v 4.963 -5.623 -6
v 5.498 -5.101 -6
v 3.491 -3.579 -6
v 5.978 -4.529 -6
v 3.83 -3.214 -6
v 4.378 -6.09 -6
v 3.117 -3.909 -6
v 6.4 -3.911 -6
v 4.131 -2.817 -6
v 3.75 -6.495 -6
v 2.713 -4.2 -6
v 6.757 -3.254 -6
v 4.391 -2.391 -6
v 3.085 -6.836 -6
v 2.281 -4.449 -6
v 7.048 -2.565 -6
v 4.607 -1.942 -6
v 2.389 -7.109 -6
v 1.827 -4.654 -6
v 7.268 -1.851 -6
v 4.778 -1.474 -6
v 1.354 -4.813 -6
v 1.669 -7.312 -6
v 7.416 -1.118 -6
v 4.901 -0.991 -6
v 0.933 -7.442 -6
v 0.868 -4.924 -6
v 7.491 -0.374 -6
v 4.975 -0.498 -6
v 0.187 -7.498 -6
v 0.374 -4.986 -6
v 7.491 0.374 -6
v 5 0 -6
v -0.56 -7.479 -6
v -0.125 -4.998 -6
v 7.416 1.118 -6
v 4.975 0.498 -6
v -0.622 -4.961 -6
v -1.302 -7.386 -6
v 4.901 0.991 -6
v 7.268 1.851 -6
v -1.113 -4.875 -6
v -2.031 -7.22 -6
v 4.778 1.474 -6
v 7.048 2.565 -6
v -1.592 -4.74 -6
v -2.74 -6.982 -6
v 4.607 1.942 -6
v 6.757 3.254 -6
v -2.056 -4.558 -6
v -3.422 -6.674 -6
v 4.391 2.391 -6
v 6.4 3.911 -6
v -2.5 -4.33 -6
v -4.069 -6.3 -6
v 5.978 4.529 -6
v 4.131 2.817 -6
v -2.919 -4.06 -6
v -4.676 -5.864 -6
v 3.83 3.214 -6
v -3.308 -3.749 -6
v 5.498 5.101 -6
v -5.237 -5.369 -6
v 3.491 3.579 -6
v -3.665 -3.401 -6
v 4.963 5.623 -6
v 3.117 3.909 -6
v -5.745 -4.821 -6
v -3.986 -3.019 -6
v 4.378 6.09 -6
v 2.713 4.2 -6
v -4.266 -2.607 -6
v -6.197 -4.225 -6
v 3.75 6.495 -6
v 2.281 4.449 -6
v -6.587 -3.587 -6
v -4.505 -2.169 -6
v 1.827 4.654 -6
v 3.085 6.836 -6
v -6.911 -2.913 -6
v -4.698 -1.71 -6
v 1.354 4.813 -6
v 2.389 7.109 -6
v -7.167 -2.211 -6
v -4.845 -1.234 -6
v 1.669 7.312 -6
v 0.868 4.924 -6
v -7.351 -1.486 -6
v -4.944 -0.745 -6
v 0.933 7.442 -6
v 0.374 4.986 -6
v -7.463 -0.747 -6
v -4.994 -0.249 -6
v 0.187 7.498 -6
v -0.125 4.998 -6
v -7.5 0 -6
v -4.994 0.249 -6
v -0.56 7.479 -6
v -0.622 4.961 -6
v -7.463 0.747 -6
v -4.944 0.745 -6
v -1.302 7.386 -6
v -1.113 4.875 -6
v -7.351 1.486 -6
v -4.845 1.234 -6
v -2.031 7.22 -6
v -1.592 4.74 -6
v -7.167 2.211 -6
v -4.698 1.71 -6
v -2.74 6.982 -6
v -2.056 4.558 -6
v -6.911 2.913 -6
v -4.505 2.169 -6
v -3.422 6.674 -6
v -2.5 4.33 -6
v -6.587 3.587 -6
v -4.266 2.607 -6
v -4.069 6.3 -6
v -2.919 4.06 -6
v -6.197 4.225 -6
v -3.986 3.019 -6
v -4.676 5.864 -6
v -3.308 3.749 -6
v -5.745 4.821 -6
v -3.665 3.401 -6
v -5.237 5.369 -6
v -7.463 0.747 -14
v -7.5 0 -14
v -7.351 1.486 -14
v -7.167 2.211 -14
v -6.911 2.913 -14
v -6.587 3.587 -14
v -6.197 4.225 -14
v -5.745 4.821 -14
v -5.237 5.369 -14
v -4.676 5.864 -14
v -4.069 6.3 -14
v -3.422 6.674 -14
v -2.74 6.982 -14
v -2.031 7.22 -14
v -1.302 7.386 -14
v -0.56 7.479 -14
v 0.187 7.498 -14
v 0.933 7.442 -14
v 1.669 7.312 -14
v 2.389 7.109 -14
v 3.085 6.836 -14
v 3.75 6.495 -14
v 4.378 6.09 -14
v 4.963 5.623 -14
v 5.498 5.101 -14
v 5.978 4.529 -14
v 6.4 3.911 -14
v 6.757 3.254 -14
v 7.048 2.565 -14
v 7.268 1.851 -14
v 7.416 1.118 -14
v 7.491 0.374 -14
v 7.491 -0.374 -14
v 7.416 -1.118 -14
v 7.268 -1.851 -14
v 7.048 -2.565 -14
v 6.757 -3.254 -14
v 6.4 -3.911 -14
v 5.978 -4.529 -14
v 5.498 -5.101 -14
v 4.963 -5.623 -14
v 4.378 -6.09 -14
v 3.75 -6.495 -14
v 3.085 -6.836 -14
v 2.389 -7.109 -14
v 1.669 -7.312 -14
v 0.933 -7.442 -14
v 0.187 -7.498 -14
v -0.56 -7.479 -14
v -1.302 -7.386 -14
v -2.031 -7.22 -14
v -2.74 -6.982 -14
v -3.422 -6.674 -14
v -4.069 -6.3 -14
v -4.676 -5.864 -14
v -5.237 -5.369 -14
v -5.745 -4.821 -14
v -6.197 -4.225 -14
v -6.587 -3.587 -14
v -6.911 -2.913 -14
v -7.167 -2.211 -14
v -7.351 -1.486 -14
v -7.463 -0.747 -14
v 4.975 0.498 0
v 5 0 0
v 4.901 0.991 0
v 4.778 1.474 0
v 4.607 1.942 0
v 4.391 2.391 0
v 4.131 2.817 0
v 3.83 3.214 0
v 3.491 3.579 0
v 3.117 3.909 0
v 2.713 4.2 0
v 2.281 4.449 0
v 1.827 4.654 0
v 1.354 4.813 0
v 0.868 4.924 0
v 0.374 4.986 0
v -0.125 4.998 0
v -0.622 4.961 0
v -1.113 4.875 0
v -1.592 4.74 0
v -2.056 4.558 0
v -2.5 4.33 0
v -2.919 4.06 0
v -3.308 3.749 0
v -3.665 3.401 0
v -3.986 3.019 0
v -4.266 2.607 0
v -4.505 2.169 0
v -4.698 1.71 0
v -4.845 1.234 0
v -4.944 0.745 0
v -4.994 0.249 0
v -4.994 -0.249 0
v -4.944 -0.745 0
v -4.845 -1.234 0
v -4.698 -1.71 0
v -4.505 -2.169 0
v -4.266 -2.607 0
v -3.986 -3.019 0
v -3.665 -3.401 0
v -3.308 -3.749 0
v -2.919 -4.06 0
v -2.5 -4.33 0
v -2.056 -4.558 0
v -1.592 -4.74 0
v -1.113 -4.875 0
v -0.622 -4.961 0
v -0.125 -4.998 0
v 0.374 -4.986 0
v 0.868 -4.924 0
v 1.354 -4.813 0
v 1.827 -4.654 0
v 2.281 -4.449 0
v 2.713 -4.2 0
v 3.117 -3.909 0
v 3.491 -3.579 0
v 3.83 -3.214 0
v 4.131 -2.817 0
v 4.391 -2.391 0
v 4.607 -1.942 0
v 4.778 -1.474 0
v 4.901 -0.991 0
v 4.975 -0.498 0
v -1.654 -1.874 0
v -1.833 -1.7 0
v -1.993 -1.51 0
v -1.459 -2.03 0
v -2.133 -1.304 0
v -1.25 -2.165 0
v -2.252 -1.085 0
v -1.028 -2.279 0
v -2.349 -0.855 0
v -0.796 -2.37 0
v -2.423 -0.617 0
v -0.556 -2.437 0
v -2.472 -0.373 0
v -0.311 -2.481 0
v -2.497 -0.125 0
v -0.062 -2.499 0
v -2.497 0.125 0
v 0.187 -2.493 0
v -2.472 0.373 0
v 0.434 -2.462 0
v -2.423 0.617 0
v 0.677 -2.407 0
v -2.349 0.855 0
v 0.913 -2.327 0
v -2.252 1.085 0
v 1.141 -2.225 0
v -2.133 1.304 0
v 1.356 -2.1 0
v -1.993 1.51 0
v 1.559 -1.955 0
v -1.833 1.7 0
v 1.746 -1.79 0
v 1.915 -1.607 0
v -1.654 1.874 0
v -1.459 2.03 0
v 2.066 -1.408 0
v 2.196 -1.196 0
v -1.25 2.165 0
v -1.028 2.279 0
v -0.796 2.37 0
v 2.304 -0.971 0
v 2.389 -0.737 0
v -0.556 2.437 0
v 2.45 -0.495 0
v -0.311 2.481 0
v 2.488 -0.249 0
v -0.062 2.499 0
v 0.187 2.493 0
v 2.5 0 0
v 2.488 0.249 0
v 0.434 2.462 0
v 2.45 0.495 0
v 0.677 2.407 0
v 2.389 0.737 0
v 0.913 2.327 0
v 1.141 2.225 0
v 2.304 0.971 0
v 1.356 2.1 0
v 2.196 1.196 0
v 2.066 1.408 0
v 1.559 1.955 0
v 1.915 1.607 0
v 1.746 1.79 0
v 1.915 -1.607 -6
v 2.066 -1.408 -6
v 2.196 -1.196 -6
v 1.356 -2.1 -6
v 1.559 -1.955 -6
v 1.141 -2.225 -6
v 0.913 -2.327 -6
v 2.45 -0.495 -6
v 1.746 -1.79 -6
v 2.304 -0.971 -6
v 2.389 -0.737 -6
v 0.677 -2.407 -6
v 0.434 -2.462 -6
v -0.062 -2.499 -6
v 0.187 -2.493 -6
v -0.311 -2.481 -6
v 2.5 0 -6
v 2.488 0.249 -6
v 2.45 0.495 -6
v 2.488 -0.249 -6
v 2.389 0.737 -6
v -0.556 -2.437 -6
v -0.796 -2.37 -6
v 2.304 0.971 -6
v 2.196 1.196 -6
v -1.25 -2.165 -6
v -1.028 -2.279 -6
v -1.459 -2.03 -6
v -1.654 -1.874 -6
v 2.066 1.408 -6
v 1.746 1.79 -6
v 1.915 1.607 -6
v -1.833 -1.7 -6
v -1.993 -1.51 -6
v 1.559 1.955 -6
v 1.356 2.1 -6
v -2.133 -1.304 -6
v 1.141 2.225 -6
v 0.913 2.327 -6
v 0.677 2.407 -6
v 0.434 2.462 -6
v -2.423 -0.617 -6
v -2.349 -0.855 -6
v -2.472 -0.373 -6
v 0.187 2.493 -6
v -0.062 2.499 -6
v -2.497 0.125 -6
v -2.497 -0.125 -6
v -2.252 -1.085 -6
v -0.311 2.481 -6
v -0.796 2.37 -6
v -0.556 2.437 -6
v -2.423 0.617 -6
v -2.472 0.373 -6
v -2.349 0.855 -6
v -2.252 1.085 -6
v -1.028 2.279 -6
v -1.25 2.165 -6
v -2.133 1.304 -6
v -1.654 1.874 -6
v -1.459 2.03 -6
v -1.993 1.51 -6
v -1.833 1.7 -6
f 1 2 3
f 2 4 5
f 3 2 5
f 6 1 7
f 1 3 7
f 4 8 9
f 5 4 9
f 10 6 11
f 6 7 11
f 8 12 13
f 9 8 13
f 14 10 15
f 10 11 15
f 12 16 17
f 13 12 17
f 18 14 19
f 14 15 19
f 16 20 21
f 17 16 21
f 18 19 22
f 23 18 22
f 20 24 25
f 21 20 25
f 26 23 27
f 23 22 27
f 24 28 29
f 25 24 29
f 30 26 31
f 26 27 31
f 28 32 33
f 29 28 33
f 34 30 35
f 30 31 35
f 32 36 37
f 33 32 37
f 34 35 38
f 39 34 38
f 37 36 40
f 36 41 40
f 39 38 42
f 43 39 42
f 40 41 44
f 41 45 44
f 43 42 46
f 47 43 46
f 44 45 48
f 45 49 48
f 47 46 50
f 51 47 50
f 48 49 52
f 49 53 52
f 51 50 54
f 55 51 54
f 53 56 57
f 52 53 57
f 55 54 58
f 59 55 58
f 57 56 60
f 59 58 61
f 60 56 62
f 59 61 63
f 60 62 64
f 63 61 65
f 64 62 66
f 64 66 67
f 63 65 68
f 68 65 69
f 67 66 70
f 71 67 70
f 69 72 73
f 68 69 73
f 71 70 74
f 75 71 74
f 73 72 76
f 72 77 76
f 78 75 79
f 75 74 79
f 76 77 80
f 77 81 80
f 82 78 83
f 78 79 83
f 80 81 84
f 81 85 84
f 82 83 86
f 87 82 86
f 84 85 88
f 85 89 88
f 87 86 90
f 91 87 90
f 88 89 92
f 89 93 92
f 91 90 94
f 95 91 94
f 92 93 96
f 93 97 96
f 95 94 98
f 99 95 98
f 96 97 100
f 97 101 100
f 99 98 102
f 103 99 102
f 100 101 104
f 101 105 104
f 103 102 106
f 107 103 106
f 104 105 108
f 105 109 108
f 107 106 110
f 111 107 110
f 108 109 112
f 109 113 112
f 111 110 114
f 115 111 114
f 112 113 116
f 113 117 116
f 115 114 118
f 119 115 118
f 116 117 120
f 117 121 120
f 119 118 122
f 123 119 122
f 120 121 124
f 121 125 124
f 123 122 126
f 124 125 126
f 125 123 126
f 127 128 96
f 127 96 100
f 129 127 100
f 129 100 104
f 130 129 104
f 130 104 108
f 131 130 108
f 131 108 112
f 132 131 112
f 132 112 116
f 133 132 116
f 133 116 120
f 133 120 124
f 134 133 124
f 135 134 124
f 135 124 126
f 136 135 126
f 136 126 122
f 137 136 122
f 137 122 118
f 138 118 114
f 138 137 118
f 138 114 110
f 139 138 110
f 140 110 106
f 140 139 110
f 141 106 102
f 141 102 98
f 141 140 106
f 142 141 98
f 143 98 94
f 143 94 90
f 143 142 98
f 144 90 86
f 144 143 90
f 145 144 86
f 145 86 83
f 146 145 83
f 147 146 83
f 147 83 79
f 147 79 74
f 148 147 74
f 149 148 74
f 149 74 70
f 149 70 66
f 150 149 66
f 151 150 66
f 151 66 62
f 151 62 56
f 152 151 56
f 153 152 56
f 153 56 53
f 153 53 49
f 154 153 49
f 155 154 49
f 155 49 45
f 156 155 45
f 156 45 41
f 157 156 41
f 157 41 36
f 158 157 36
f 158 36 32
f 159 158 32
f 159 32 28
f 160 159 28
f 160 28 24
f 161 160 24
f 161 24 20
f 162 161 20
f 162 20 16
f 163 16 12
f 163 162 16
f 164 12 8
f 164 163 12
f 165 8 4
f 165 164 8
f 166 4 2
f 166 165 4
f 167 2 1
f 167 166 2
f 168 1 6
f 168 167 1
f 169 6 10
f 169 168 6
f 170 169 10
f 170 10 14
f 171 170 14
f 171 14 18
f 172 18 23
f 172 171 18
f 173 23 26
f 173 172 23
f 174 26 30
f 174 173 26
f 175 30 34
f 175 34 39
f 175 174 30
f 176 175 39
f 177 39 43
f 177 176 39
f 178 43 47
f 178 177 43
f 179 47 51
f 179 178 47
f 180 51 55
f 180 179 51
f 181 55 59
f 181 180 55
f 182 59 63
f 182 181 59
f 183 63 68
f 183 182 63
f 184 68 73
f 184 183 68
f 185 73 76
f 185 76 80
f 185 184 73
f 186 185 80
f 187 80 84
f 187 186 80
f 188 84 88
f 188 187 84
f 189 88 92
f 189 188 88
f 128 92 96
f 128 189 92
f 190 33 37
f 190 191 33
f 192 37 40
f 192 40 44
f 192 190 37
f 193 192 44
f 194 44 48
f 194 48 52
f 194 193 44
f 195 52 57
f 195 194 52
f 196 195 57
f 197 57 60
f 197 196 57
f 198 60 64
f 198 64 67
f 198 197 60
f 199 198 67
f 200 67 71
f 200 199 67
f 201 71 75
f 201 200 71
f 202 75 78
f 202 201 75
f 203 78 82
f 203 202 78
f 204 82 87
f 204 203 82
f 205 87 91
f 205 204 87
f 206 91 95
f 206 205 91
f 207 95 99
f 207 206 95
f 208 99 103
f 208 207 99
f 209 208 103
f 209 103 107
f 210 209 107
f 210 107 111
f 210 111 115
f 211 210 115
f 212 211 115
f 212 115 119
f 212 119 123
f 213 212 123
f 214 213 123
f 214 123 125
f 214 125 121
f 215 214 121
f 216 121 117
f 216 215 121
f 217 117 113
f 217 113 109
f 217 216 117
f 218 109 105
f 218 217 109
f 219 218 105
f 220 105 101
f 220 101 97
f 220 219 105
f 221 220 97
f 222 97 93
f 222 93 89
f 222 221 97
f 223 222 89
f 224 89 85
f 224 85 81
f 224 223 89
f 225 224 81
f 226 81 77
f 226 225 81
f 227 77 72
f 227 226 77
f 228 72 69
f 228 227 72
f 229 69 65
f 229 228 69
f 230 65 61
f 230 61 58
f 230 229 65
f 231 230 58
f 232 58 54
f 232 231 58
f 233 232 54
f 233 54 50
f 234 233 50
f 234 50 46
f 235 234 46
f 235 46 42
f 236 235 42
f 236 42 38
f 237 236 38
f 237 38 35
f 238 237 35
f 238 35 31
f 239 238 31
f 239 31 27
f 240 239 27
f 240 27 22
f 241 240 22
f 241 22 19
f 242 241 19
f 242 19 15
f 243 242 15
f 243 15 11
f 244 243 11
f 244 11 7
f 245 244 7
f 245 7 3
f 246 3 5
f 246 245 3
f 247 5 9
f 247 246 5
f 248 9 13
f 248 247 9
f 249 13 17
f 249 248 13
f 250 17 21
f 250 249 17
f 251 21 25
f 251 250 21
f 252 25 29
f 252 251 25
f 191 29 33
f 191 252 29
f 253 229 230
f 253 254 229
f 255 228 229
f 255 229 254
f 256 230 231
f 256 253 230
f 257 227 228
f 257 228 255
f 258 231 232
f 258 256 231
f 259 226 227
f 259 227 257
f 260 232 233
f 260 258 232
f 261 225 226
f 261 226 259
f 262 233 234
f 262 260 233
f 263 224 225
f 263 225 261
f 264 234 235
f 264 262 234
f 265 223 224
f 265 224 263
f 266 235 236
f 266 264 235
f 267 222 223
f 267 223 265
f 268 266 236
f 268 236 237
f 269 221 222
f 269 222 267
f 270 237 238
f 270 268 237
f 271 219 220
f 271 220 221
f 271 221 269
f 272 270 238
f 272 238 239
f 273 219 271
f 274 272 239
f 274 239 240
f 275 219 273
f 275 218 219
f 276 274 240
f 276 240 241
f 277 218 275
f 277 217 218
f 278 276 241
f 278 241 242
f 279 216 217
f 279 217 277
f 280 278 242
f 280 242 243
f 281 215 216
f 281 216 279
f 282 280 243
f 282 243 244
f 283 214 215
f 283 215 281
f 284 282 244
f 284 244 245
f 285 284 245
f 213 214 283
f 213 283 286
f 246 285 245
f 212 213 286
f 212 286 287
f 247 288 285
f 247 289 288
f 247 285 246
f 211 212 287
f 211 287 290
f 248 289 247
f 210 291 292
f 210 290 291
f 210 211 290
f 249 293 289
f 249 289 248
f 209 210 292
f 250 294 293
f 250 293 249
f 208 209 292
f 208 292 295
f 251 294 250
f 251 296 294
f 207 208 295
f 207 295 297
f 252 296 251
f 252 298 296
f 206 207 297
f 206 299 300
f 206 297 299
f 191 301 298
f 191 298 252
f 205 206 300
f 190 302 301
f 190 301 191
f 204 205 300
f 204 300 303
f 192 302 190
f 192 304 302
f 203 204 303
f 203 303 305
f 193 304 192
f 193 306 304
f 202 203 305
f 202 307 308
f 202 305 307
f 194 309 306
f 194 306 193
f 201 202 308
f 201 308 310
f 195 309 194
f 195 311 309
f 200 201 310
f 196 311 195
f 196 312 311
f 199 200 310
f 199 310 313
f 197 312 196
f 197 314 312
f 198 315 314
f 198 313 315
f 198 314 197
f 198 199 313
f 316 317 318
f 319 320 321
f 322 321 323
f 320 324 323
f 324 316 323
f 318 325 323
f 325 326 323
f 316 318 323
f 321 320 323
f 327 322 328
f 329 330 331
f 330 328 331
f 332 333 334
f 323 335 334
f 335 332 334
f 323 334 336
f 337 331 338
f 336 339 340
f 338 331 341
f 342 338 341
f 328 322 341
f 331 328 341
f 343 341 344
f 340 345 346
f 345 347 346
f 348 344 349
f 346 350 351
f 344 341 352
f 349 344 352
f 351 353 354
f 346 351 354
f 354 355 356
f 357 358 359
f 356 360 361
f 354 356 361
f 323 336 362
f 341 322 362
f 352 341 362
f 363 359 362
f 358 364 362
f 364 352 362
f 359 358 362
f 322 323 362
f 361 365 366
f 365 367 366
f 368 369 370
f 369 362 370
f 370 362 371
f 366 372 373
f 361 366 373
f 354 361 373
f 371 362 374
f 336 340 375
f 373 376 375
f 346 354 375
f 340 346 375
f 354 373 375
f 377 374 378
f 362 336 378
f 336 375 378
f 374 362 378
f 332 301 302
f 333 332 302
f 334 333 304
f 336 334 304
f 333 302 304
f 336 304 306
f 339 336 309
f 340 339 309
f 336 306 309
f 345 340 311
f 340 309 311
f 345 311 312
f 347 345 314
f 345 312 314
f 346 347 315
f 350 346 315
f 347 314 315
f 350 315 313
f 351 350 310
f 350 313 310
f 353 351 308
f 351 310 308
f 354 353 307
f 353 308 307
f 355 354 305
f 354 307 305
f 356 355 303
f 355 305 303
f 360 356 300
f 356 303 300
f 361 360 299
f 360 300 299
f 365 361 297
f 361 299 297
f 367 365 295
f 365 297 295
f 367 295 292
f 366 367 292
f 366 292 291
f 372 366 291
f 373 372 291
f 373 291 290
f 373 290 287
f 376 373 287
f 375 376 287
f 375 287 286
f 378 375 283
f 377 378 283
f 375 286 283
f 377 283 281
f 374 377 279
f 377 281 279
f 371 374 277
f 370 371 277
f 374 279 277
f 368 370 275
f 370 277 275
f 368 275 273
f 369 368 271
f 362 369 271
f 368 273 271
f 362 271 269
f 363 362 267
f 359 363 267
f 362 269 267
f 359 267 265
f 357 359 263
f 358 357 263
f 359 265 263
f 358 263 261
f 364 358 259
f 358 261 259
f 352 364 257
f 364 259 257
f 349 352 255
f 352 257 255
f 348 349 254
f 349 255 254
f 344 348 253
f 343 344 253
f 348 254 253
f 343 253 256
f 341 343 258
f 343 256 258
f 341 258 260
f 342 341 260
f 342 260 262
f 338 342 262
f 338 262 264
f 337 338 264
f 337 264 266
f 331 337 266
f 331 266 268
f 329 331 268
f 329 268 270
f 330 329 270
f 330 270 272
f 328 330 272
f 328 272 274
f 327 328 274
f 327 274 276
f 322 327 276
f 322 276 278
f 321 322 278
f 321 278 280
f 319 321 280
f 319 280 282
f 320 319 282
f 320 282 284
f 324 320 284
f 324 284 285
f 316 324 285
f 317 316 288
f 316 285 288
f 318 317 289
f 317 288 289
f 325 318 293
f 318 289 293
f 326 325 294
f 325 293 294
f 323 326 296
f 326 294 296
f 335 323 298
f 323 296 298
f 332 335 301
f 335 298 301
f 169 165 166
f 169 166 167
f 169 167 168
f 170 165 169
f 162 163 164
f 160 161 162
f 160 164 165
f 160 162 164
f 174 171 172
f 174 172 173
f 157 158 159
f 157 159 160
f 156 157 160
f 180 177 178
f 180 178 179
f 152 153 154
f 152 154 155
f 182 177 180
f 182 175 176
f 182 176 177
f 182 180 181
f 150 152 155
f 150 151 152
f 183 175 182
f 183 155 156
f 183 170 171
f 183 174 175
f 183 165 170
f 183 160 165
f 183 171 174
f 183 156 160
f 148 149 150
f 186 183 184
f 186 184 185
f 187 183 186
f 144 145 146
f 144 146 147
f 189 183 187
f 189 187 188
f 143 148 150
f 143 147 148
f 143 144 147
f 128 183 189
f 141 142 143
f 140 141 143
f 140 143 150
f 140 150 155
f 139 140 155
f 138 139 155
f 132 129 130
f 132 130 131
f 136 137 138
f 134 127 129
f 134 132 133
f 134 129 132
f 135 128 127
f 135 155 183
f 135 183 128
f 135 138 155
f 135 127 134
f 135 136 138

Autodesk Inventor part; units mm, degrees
ref_plane "YZ Plane" through (0, 0, 0) normal (1, 0, 0) x (0, 1, 0)
ref_plane "XZ Plane" through (0, 0, 0) normal (0, 1, 0) x (-1, 0, 0)
ref_plane "XY Plane" through (0, 0, 0) normal (0, 0, 1) x (1, 0, 0)
sketch "Sketch1" plane through (0, 0, 0) normal (0, 0, 1) x (1, 0, 0)
  circle A0 centre (0, 0) radius 2.5 projected
  circle A1 centre (0, 0) radius 5
  dimension "d0" = 10
extrude "Extrusion1" add sketch "Sketch1" against normal blind 14
sketch "Sketch2" plane through (0, 0, -14) normal (0, 0, -1) x (-1, 0, 0)
  circle A0 centre (0, 0) radius 7.5
  dimension "d3" = 15
extrude "Extrusion2" add sketch "Sketch2" against normal blind 8
properties part number "Gear_ele"
